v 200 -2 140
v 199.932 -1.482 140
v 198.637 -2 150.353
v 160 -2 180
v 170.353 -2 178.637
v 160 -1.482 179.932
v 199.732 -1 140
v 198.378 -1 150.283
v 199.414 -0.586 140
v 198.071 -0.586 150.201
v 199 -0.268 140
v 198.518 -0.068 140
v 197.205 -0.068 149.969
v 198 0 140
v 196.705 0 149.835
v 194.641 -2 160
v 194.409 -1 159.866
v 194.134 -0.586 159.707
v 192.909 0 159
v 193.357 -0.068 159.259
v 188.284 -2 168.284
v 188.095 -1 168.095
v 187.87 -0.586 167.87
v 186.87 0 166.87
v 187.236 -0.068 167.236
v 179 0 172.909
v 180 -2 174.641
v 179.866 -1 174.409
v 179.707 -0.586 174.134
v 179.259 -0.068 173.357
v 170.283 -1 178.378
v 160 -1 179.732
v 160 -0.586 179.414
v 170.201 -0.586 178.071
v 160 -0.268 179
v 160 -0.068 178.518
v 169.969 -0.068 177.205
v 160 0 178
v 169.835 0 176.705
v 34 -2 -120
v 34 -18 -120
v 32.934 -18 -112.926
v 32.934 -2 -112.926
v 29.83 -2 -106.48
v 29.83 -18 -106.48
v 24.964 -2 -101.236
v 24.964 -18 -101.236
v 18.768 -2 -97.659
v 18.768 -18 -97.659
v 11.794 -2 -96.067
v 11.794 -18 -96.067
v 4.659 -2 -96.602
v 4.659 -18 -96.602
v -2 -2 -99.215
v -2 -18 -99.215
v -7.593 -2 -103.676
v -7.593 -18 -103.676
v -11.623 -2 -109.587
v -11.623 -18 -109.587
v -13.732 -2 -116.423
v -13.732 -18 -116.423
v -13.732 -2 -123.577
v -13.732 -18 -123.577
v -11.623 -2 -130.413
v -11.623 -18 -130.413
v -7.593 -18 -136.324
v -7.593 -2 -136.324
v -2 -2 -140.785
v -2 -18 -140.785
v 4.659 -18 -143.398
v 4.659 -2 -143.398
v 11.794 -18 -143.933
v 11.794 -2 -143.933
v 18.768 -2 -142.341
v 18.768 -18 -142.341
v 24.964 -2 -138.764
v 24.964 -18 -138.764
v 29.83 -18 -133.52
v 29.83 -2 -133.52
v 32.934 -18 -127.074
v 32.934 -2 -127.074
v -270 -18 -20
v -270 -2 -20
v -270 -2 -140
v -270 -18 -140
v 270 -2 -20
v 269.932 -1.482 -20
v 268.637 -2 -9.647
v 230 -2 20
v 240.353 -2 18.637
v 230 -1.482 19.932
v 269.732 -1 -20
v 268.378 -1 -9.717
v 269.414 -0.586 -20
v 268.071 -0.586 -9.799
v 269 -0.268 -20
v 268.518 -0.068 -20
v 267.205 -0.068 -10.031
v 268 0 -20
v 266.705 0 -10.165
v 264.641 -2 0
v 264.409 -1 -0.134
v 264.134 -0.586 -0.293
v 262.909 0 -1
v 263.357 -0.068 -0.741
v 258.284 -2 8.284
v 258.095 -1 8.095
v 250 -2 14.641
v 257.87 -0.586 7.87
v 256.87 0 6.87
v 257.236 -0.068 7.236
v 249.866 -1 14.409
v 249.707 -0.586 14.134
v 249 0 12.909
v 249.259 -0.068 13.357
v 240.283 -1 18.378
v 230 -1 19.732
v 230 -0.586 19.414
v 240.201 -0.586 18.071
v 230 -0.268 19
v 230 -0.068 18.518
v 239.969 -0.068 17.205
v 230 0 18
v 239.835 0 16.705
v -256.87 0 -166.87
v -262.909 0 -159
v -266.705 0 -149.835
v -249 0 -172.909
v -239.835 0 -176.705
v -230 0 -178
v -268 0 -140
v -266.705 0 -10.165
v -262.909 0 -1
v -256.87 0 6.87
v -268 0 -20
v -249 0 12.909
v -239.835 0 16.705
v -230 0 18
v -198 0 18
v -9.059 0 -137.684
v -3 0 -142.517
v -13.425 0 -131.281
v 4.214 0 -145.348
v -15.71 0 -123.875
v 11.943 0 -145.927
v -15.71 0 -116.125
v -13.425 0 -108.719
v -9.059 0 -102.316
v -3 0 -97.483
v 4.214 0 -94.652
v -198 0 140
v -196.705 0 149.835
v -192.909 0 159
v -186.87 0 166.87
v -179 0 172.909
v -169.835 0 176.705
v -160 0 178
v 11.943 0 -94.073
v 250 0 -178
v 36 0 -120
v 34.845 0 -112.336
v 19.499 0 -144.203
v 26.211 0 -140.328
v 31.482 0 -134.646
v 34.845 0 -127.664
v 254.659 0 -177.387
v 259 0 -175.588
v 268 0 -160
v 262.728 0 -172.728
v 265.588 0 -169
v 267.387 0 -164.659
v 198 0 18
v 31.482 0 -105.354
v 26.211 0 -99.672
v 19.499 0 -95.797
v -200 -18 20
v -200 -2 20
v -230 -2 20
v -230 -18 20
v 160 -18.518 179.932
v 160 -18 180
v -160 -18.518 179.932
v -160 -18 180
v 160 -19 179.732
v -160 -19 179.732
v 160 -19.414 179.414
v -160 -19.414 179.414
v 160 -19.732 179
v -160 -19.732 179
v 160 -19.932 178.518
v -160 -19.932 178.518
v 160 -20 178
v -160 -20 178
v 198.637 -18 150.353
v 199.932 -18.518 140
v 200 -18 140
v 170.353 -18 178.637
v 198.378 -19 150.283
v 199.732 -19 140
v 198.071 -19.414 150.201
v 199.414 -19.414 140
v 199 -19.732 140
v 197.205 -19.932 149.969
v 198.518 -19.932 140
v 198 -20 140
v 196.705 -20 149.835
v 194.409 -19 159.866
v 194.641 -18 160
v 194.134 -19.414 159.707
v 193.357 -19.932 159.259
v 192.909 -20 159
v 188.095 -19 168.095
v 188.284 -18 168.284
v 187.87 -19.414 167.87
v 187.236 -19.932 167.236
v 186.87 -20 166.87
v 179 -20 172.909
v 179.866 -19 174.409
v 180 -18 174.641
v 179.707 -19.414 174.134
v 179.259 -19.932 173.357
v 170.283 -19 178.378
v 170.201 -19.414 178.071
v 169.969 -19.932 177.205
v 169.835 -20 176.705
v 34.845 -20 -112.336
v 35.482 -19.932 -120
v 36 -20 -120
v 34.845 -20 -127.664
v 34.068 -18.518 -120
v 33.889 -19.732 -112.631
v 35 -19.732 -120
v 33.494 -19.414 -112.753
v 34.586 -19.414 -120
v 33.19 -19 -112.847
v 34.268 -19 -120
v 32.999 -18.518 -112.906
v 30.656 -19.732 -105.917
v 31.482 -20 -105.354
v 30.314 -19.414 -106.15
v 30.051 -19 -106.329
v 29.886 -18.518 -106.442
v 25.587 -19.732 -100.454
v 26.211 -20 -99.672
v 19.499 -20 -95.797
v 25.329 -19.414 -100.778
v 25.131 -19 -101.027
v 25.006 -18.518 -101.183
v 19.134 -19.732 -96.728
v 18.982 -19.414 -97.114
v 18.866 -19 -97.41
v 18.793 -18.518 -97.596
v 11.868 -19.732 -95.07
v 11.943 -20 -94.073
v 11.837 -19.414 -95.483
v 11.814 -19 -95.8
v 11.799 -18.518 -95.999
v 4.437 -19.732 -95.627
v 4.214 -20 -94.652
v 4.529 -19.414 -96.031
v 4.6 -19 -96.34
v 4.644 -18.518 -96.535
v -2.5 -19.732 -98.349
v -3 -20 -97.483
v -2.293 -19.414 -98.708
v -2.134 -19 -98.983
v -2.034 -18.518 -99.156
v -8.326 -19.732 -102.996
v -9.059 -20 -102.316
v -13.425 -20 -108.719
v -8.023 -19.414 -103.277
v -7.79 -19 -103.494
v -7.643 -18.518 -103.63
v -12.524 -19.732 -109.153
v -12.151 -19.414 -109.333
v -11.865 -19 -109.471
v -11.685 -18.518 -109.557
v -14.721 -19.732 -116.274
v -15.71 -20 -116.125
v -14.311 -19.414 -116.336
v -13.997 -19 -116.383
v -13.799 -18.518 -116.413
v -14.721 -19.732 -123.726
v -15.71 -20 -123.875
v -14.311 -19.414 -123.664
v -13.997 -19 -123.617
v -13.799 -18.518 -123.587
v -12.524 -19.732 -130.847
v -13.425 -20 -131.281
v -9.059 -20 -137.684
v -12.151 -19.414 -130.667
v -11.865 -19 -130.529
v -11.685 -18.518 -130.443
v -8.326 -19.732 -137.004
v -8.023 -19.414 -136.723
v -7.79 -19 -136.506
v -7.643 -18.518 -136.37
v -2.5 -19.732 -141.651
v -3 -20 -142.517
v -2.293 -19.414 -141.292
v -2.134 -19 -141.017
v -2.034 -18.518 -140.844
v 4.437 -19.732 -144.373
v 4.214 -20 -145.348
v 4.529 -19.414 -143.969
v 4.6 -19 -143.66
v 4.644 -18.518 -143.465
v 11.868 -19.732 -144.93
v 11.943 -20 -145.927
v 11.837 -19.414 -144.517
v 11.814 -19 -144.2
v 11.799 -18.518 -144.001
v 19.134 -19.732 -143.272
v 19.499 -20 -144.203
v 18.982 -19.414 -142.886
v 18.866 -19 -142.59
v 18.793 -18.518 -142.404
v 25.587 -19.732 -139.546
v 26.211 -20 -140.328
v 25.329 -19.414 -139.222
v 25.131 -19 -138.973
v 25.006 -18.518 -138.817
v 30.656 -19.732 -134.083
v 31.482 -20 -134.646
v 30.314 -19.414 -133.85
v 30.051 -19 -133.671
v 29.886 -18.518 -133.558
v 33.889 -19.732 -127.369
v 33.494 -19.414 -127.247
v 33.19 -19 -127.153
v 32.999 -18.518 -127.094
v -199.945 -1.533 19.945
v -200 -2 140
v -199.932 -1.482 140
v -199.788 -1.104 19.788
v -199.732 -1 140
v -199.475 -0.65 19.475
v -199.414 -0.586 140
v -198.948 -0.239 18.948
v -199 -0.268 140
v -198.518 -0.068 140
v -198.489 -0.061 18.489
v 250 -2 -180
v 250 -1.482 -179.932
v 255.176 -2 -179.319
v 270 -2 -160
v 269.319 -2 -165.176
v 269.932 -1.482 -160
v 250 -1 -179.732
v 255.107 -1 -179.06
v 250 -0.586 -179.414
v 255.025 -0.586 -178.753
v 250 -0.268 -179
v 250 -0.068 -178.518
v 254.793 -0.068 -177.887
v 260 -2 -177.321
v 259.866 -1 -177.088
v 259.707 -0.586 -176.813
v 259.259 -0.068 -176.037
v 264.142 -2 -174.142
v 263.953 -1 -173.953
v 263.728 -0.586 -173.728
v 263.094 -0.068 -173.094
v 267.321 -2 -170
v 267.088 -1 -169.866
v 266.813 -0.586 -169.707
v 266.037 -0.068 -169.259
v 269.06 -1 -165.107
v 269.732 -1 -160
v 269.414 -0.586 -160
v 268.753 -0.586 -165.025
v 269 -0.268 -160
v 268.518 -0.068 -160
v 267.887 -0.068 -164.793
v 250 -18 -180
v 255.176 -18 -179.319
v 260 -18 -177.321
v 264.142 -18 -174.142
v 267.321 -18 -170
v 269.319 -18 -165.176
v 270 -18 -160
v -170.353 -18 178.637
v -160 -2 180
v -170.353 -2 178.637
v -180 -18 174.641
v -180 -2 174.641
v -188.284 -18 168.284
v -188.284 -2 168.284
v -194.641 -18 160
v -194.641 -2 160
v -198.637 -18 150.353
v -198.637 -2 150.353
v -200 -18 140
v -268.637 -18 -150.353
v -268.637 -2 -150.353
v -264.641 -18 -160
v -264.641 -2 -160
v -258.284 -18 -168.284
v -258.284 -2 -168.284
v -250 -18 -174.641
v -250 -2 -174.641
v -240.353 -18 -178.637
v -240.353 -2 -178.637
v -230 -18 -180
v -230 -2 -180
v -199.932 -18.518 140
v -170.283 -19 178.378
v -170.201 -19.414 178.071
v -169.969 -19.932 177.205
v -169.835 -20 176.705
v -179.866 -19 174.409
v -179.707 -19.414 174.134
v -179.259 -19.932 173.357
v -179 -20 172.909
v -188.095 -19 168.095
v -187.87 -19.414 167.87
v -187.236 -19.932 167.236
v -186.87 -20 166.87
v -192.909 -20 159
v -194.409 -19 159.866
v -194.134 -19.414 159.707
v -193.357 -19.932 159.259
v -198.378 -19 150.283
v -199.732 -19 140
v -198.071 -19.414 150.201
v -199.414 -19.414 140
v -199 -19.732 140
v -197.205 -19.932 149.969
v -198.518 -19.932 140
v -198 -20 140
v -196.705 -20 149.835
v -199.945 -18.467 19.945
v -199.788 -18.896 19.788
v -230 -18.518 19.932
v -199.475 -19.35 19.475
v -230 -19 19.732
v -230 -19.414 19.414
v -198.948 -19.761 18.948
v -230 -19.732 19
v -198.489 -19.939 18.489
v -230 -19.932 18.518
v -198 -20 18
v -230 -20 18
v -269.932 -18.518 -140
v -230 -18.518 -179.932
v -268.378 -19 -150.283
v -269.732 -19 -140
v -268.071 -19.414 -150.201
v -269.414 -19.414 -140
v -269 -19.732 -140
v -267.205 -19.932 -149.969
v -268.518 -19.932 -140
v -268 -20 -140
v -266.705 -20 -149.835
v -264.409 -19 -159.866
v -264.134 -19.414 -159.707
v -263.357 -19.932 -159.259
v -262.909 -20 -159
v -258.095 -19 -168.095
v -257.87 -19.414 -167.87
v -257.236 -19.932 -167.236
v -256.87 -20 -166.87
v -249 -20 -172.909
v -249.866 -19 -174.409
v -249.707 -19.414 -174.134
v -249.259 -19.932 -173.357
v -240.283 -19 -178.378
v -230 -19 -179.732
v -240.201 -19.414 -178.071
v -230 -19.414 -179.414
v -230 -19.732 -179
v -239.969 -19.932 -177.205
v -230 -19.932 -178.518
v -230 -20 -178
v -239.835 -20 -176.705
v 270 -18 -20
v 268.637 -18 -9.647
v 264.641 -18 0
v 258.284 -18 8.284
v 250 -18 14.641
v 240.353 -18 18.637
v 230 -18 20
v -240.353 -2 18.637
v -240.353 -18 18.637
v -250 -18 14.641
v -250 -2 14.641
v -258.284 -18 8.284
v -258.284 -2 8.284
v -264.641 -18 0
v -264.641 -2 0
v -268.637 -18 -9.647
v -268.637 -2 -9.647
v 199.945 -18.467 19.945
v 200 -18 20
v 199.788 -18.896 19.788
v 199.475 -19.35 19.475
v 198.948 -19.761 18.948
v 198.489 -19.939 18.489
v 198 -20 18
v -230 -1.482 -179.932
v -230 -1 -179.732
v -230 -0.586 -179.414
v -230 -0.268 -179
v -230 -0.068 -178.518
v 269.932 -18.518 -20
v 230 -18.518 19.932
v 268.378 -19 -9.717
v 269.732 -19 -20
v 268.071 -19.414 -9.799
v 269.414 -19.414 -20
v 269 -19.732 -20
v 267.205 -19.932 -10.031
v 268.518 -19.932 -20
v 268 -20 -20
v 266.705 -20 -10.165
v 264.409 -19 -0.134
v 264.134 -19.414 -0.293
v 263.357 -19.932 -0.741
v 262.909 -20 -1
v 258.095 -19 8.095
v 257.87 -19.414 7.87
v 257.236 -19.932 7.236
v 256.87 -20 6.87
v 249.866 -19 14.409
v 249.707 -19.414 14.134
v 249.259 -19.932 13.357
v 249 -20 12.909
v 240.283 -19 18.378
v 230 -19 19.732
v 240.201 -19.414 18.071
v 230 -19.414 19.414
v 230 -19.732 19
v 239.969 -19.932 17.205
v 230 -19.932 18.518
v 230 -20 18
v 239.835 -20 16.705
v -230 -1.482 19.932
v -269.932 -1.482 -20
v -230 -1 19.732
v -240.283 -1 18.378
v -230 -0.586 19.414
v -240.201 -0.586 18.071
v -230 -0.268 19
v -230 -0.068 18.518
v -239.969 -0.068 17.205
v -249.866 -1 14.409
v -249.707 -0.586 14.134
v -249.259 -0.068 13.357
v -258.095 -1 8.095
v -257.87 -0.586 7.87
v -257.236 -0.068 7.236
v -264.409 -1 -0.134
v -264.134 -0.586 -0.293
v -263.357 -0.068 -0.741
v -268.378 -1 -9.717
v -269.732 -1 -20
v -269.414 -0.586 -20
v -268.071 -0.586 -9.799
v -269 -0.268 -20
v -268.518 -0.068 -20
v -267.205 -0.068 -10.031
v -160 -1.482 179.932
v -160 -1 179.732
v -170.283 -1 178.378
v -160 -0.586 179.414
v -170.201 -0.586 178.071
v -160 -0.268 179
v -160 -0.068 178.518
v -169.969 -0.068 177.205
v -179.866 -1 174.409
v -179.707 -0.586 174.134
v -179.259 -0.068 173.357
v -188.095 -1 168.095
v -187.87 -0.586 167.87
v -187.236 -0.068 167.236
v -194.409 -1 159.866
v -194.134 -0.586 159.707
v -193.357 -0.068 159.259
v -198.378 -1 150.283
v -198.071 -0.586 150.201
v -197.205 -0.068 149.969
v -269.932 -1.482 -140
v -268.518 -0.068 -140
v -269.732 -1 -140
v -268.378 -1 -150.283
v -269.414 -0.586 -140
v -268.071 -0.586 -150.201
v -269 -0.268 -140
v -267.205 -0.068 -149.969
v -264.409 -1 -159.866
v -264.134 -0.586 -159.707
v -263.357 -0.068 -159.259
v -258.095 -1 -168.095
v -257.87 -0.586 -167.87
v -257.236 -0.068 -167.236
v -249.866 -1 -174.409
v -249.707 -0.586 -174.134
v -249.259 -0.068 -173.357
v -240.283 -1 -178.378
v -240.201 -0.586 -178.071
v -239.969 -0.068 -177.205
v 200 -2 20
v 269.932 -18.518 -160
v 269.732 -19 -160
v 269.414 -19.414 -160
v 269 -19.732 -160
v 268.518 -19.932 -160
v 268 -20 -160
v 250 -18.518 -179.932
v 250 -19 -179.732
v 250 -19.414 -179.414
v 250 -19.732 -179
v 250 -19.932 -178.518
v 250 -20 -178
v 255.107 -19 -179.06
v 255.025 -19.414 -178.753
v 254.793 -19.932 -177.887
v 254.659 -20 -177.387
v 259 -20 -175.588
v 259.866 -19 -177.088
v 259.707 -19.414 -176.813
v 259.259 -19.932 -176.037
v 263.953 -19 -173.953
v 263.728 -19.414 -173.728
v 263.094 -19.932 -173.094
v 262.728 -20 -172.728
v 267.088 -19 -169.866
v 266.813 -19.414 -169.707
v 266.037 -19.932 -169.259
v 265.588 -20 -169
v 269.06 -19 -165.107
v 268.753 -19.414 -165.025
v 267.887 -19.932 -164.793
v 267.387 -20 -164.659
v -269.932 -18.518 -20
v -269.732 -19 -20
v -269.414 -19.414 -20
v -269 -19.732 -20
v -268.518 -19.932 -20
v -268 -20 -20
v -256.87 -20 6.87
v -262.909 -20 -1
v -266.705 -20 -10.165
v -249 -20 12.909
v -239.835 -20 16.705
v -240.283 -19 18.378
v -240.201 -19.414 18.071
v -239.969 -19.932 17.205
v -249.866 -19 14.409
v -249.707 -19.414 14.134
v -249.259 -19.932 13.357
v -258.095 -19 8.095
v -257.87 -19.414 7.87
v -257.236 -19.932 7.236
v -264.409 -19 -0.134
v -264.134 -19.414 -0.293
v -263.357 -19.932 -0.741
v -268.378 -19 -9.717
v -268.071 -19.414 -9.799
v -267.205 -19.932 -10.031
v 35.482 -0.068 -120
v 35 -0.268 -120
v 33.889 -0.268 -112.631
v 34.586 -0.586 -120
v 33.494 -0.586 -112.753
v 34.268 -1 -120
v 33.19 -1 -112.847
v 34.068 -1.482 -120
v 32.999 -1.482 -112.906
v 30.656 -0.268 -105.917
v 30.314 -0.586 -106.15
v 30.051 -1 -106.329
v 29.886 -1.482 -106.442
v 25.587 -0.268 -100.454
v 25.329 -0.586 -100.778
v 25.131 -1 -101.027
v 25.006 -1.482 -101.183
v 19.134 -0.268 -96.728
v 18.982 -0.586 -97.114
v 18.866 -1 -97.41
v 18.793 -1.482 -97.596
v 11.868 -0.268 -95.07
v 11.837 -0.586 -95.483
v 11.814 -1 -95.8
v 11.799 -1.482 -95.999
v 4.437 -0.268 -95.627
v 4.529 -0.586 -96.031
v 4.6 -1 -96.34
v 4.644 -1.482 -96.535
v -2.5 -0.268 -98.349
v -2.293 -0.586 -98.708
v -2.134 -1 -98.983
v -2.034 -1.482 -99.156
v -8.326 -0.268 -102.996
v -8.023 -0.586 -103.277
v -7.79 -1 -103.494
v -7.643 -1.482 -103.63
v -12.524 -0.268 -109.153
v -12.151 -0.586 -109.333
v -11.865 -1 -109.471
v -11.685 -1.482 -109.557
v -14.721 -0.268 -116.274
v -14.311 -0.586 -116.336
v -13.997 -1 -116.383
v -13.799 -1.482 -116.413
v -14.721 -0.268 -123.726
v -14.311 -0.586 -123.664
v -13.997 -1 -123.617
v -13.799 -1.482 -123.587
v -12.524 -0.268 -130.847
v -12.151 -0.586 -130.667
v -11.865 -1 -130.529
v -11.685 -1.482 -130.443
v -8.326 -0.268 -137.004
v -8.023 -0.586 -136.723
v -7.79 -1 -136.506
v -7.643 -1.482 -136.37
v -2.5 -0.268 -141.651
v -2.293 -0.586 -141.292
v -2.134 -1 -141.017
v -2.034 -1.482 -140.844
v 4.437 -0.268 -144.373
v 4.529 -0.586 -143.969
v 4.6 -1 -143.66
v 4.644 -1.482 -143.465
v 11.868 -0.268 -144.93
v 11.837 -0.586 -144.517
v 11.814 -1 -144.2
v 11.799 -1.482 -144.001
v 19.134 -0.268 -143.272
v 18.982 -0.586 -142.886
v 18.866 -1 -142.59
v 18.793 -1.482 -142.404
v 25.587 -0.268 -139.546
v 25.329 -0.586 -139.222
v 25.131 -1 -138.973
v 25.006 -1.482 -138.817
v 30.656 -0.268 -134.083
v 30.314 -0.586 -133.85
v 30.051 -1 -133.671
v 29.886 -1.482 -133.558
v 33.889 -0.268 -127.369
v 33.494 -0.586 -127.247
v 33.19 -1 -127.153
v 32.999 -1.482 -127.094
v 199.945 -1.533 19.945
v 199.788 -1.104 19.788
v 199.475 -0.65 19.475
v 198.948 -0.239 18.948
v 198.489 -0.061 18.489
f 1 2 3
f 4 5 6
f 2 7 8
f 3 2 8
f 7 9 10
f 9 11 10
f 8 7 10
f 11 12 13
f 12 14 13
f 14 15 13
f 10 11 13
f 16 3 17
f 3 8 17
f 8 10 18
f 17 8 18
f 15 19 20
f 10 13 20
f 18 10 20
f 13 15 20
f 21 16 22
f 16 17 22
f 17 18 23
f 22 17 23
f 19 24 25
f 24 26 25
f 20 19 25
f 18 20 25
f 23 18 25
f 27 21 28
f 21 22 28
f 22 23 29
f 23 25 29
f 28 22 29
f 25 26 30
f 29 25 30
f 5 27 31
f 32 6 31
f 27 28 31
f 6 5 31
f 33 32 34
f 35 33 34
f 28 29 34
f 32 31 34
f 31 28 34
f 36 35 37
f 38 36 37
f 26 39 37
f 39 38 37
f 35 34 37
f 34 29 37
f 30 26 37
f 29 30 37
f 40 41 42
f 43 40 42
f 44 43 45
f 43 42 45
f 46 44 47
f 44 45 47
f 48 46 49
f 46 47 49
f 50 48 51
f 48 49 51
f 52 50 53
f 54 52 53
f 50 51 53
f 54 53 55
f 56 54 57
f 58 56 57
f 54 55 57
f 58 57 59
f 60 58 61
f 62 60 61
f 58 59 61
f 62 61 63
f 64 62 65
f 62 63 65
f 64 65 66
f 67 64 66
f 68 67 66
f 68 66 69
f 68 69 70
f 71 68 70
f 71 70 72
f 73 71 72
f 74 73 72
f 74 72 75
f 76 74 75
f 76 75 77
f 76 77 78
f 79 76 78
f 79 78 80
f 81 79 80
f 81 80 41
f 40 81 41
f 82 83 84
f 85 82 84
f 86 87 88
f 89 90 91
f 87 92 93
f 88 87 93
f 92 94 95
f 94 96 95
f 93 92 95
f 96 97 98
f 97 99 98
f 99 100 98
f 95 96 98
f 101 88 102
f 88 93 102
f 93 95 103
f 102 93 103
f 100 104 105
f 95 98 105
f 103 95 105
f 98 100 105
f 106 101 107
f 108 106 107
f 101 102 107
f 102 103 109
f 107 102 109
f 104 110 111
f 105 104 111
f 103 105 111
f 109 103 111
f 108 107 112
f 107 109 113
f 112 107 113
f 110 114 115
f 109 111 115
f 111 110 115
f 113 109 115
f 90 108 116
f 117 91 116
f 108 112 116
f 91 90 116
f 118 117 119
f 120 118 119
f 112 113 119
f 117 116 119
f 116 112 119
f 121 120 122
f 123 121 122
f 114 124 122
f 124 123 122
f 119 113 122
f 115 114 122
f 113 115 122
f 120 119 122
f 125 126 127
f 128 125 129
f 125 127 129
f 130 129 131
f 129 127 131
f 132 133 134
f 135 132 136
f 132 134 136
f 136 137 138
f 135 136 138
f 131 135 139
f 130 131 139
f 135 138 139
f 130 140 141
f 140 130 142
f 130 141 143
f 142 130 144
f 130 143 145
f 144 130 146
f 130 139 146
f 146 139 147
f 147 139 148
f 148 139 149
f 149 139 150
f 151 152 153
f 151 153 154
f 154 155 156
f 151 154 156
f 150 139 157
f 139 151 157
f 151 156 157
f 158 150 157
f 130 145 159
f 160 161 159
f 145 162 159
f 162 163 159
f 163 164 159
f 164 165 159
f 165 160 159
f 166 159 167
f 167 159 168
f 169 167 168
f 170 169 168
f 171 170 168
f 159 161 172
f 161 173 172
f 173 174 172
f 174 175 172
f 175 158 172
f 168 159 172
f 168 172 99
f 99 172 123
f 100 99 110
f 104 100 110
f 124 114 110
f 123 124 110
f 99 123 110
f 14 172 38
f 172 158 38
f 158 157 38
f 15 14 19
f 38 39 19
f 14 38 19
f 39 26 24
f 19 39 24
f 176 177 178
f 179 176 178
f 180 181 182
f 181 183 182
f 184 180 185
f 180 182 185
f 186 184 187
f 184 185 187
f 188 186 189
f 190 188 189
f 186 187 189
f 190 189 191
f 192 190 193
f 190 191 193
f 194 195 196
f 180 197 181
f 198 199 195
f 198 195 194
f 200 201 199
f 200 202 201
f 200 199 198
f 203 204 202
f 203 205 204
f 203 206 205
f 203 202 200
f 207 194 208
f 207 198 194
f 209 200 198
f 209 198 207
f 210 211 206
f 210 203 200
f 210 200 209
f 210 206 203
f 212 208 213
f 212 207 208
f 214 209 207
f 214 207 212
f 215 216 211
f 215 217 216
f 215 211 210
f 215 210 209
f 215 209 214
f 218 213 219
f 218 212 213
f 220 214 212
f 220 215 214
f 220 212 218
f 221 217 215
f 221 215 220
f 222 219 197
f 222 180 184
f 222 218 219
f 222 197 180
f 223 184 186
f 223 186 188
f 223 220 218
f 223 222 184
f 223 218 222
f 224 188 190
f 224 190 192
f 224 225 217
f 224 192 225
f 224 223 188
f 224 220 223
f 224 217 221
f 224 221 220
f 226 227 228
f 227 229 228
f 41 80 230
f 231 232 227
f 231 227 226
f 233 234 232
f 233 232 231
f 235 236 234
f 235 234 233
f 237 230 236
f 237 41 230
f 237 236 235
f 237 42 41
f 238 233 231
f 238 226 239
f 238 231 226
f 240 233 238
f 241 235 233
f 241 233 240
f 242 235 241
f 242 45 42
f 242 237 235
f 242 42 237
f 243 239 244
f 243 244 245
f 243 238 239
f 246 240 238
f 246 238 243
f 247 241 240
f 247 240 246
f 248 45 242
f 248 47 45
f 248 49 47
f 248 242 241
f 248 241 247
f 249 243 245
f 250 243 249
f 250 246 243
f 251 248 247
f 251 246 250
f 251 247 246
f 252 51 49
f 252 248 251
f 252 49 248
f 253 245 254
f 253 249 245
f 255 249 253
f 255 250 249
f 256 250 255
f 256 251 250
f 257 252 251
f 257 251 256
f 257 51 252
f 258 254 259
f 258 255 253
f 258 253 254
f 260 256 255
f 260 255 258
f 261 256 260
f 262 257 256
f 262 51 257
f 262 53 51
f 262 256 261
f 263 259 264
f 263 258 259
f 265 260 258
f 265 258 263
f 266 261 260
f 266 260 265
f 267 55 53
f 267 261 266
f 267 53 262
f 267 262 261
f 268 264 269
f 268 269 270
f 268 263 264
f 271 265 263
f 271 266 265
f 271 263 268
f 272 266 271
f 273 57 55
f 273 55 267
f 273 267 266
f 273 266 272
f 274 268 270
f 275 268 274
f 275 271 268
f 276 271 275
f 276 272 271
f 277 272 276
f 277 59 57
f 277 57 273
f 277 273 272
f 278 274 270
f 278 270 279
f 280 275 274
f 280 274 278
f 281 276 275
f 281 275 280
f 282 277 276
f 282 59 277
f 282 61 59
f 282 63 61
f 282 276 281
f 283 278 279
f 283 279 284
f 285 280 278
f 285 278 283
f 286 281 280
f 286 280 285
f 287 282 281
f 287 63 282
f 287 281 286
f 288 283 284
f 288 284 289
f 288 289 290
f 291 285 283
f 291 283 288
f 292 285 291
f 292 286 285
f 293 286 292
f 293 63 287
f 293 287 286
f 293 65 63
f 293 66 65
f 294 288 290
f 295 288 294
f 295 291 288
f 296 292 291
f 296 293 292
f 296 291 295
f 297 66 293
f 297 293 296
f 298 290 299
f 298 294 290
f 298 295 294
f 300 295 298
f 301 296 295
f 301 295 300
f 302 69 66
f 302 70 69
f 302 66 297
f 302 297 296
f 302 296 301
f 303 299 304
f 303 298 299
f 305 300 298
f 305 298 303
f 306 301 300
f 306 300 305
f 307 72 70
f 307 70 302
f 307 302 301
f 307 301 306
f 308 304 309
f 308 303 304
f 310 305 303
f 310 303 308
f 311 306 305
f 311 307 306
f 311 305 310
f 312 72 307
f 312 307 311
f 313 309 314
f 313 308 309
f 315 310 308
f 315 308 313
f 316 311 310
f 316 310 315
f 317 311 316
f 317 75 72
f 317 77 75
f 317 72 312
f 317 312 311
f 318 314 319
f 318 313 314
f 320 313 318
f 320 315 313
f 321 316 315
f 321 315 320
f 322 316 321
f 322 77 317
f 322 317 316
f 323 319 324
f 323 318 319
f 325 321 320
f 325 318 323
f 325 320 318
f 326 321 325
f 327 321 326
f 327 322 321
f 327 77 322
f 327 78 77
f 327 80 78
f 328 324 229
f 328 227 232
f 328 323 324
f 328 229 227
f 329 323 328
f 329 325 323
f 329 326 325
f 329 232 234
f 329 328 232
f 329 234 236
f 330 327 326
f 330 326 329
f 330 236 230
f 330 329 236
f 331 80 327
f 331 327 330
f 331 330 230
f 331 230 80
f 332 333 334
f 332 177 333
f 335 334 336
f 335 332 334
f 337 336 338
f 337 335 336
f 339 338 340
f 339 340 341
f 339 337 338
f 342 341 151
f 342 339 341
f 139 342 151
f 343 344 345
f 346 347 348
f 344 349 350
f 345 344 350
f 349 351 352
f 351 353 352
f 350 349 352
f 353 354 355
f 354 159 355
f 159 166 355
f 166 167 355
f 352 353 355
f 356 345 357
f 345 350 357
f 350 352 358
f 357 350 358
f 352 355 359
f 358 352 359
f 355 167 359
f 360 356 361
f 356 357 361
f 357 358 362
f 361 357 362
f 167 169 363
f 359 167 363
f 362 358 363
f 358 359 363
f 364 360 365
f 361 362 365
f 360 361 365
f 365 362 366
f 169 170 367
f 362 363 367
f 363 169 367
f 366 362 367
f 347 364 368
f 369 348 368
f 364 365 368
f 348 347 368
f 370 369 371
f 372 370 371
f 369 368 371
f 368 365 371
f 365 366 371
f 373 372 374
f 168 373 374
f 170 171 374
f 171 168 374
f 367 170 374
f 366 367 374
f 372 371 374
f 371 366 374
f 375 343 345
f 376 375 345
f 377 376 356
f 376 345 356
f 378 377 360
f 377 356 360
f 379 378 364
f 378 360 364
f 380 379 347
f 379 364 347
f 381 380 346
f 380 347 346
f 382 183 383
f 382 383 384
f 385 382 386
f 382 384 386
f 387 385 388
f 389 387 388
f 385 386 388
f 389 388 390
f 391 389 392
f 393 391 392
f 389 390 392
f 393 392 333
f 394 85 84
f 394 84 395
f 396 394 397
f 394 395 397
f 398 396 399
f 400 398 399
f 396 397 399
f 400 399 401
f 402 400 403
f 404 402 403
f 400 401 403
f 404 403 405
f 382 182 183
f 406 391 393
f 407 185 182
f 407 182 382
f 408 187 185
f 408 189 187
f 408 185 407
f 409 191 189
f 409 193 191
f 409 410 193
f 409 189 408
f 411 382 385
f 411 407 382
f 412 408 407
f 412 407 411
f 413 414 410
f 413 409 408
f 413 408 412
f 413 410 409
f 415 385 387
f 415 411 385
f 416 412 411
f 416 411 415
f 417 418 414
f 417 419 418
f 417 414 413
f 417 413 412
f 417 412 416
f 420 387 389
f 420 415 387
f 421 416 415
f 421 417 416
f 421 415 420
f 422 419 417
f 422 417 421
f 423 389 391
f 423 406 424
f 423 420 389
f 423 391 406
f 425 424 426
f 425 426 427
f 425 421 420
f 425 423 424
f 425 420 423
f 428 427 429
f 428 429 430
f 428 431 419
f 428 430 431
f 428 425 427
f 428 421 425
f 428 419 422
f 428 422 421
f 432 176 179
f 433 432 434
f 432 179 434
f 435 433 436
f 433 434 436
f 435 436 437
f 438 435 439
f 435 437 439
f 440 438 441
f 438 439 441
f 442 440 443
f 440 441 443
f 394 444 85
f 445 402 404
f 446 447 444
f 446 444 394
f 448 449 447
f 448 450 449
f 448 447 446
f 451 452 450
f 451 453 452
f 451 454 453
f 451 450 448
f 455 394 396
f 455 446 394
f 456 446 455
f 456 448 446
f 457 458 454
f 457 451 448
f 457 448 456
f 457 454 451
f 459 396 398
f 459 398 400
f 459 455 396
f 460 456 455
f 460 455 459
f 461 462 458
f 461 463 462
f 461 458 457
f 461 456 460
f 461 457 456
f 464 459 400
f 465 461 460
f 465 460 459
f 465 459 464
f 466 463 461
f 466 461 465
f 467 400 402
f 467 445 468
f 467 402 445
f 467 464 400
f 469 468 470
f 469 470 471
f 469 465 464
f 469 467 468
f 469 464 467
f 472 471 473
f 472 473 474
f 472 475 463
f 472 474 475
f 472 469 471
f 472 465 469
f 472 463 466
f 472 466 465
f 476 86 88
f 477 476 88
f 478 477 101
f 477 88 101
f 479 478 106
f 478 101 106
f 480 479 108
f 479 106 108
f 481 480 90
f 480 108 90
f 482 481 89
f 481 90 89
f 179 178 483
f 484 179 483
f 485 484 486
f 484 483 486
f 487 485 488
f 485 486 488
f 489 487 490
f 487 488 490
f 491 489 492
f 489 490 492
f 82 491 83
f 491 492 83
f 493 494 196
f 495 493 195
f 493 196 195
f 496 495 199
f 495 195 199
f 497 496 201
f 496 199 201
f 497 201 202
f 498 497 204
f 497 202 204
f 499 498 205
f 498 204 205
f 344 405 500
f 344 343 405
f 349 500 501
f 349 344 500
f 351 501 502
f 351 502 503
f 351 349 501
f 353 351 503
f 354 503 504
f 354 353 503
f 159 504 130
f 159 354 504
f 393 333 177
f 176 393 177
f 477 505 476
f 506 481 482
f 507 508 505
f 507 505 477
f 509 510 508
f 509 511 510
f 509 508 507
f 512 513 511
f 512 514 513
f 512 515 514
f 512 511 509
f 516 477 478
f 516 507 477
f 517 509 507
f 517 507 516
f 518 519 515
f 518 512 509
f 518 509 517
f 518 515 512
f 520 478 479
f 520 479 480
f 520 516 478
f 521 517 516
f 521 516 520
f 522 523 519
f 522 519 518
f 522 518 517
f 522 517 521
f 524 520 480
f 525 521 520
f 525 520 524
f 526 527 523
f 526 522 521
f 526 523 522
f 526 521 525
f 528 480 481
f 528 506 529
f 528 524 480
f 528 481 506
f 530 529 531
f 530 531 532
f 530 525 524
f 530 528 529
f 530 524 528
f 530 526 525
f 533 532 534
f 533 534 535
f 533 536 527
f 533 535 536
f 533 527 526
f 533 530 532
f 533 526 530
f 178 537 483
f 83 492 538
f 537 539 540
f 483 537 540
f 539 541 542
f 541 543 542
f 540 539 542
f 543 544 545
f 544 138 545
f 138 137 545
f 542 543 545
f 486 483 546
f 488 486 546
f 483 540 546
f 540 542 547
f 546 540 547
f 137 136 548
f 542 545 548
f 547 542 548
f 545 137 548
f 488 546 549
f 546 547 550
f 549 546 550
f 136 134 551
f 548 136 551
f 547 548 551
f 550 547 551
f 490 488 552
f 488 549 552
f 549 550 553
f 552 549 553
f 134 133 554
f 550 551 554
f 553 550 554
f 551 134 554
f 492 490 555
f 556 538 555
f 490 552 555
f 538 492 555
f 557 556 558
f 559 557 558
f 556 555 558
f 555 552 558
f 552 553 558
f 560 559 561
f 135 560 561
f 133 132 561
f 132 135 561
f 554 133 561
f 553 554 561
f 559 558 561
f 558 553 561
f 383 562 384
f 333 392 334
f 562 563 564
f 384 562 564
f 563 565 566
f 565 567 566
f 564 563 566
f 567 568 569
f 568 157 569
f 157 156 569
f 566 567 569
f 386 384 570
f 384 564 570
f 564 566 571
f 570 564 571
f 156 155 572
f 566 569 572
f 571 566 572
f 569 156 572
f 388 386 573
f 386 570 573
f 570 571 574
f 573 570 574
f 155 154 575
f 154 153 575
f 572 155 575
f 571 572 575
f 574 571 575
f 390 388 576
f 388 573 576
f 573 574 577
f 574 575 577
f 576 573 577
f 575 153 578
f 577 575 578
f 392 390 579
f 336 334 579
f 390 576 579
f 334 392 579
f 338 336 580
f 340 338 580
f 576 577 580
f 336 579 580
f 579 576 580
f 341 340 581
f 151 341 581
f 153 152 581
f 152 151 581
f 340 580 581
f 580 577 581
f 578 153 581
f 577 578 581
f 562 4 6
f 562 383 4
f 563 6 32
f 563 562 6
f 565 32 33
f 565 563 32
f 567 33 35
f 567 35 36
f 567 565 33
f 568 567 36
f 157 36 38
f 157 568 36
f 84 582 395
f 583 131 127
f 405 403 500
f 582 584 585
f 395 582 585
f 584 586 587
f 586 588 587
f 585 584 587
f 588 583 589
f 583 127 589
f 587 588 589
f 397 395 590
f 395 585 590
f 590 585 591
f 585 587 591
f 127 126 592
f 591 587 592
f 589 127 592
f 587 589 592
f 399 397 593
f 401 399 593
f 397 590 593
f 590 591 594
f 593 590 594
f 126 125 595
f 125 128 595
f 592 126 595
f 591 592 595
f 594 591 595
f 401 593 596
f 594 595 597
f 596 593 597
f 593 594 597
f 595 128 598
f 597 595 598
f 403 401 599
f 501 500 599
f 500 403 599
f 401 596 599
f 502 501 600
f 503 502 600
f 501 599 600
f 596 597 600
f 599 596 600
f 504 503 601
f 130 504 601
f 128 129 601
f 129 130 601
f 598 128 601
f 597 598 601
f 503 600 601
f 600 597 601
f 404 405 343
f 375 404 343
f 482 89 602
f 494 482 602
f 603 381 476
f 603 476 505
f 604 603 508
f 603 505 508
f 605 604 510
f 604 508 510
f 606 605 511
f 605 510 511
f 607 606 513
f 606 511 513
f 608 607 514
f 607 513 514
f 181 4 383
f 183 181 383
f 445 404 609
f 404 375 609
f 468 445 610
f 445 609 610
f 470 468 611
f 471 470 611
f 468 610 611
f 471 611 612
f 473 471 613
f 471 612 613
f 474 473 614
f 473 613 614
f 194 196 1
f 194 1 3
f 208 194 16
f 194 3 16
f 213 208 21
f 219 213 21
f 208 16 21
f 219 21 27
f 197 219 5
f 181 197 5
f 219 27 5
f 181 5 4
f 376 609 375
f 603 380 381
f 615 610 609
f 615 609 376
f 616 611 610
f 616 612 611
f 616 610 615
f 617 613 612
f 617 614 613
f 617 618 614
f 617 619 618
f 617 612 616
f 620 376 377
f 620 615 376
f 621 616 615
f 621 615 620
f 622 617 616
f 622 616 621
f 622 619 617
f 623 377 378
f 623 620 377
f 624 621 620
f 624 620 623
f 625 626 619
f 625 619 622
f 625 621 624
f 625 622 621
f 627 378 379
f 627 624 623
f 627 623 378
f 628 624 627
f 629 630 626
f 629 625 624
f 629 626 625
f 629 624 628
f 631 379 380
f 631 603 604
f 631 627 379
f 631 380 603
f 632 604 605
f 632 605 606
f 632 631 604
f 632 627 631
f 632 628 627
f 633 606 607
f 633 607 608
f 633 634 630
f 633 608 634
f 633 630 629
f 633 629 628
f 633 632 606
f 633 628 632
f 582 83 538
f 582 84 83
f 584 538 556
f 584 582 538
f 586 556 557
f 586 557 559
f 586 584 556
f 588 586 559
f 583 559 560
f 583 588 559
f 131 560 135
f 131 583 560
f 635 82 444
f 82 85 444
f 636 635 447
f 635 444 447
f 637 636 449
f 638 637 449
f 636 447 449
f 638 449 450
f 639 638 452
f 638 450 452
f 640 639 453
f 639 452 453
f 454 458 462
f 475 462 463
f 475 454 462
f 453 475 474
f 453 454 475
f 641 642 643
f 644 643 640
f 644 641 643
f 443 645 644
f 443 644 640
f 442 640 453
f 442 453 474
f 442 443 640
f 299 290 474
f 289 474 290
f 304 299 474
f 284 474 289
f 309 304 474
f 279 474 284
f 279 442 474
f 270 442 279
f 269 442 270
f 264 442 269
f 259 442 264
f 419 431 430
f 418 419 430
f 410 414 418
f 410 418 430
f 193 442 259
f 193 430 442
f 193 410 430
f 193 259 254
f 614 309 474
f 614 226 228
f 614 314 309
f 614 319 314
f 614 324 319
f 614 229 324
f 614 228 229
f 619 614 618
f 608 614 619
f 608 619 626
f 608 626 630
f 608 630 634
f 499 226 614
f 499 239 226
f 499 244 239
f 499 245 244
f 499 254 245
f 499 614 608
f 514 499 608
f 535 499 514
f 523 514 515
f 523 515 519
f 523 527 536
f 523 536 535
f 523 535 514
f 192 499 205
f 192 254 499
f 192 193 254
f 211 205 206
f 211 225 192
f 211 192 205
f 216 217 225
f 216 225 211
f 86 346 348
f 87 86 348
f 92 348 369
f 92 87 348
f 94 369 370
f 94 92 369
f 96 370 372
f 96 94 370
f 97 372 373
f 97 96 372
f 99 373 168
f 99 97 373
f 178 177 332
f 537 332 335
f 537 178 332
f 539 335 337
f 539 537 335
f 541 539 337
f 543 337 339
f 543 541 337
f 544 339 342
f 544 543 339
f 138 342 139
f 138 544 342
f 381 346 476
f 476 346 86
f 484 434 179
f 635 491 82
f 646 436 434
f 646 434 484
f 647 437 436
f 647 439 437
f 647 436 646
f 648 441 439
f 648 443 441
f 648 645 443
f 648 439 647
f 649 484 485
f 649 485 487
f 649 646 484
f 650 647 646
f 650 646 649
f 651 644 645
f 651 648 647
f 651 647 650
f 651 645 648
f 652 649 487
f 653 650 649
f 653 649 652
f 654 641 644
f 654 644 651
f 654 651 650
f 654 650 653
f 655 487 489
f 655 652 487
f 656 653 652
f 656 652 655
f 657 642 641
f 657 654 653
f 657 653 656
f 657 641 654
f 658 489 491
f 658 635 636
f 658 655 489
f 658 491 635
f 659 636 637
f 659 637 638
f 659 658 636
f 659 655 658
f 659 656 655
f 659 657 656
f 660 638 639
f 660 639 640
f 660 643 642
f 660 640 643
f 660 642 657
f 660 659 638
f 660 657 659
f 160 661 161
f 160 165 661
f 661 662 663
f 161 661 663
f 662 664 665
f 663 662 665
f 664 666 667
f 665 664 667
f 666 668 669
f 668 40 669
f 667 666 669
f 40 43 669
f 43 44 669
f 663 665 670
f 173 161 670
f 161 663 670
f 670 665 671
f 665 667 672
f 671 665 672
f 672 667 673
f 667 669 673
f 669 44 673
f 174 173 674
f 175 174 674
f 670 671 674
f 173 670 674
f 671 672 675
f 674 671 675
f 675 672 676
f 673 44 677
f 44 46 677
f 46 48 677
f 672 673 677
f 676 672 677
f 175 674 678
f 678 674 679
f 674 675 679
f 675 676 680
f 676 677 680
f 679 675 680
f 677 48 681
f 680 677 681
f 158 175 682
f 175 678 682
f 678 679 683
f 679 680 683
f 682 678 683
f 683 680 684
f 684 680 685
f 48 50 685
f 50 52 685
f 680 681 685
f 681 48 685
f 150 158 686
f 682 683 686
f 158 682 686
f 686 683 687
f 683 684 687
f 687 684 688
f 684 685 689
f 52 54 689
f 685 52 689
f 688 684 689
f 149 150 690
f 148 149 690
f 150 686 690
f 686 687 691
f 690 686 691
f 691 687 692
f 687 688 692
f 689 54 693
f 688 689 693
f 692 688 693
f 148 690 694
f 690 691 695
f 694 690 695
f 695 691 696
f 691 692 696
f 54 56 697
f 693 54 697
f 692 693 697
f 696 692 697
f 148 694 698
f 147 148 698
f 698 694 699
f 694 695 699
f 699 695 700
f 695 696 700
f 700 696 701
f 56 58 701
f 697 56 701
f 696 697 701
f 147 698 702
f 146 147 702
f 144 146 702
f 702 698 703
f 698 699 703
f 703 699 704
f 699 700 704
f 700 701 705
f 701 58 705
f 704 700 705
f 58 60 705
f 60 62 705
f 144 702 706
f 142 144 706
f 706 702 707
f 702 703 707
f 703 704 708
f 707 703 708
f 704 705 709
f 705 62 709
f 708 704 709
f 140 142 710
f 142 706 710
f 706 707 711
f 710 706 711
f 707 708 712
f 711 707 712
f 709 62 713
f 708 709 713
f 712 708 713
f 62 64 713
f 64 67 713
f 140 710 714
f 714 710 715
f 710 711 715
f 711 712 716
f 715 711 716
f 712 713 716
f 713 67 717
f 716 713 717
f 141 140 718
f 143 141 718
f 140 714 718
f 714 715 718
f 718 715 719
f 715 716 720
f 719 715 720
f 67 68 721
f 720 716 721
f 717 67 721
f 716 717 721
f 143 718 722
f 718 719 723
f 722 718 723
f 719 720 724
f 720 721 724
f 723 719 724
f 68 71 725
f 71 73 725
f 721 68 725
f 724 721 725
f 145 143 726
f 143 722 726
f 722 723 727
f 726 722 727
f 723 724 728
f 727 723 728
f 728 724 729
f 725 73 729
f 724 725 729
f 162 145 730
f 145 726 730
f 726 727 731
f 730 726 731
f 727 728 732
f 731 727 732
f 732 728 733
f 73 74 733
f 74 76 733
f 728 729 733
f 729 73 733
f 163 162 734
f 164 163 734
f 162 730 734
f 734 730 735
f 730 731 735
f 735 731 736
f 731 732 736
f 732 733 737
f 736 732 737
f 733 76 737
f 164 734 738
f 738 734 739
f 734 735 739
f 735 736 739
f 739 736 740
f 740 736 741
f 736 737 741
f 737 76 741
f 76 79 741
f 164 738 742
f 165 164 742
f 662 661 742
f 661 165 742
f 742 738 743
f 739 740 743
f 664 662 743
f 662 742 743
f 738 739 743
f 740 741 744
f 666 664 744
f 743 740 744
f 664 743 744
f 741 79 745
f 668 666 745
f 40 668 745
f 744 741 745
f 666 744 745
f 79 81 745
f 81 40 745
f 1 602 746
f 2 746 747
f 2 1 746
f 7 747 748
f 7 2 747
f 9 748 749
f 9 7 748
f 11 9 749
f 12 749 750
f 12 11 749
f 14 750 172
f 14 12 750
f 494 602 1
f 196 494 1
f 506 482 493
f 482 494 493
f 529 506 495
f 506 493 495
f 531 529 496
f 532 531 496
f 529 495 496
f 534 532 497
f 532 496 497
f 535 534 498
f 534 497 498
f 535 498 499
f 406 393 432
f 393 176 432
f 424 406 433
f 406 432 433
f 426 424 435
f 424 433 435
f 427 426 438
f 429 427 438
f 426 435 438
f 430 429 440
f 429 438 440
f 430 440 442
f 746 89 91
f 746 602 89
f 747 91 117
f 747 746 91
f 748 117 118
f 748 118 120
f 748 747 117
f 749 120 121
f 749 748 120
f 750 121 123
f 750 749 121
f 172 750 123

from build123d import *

# Parameters (mm, degrees)
F1_DEPTH = 20
F3_R     = 2
F5_DEPTH = 25
F6_R     = 2


with BuildPart() as f1:
    # F0 (on Front) → F1 (new body)
    with BuildSketch(Plane.XZ):
        with BuildLine():
            Line((-230, -180), (250, -180))
            ThreePointArc((250, -180), (264.142136, -174.142136), (270, -160))
            Line((270, -160), (270, -20))
            ThreePointArc((270, -20), (258.284271, 8.284271), (230, 20))
            Line((230, 20), (200, 20))
            Line((200, 20), (200, 140))
            ThreePointArc((200, 140), (188.284271, 168.284271), (160, 180))
            Line((160, 180), (-160, 180))
            ThreePointArc((-160, 180), (-188.284271, 168.284271), (-200, 140))
            Line((-200, 140), (-200, 20))
            Line((-200, 20), (-230, 20))
            ThreePointArc((-230, 20), (-258.284271, 8.284271), (-270, -20))
            Line((-270, -20), (-270, -140))
            ThreePointArc((-270, -140), (-258.284271, -168.284271), (-230, -180))
        make_face()
    extrude(amount=F1_DEPTH)

    # F3
    f3_edges = [f1.edges().sort_by_distance(p)[0] for p in [
        (10, -20, -180),
        (264.142136, -20, -174.142136),
        (270, -20, -90),
        (258.284271, -20, 8.284271),
        (215, -20, 20),
        (200, -20, 80),
        (188.284271, -20, 168.284271),
        (0, -20, 180),
        (-188.284271, -20, 168.284271),
        (-200, -20, 80),
        (-215, -20, 20),
        (-258.284271, -20, 8.284271),
        (-270, -20, -80),
        (-258.284271, -20, -168.284271),
        (10, 0, -180),
        (264.142136, 0, -174.142136),
        (270, 0, -90),
        (258.284271, 0, 8.284271),
        (215, 0, 20),
        (200, 0, 80),
        (188.284271, 0, 168.284271),
        (0, 0, 180),
        (-188.284271, 0, 168.284271),
        (-200, 0, 80),
        (-215, 0, 20),
        (-258.284271, 0, 8.284271),
        (-270, 0, -80),
        (-258.284271, 0, -168.284271),
    ]]
    fillet(f3_edges, radius=F3_R)

    # F4 (on face) → F5 (cut)
    with BuildSketch(Plane.XZ.offset(20)):
        with BuildLine():
            ThreePointArc((-14, -120), (10, -144), (34, -120))
            ThreePointArc((34, -120), (10, -96), (-14, -120))
        make_face()
    extrude(amount=-F5_DEPTH, mode=Mode.SUBTRACT)

    # F6
    f6_edges = [f1.edges().sort_by_distance(p)[0] for p in [
        (34, -20, -120),
        (34, 0, -120),
    ]]
    fillet(f6_edges, radius=F6_R)


solid = f1.part
